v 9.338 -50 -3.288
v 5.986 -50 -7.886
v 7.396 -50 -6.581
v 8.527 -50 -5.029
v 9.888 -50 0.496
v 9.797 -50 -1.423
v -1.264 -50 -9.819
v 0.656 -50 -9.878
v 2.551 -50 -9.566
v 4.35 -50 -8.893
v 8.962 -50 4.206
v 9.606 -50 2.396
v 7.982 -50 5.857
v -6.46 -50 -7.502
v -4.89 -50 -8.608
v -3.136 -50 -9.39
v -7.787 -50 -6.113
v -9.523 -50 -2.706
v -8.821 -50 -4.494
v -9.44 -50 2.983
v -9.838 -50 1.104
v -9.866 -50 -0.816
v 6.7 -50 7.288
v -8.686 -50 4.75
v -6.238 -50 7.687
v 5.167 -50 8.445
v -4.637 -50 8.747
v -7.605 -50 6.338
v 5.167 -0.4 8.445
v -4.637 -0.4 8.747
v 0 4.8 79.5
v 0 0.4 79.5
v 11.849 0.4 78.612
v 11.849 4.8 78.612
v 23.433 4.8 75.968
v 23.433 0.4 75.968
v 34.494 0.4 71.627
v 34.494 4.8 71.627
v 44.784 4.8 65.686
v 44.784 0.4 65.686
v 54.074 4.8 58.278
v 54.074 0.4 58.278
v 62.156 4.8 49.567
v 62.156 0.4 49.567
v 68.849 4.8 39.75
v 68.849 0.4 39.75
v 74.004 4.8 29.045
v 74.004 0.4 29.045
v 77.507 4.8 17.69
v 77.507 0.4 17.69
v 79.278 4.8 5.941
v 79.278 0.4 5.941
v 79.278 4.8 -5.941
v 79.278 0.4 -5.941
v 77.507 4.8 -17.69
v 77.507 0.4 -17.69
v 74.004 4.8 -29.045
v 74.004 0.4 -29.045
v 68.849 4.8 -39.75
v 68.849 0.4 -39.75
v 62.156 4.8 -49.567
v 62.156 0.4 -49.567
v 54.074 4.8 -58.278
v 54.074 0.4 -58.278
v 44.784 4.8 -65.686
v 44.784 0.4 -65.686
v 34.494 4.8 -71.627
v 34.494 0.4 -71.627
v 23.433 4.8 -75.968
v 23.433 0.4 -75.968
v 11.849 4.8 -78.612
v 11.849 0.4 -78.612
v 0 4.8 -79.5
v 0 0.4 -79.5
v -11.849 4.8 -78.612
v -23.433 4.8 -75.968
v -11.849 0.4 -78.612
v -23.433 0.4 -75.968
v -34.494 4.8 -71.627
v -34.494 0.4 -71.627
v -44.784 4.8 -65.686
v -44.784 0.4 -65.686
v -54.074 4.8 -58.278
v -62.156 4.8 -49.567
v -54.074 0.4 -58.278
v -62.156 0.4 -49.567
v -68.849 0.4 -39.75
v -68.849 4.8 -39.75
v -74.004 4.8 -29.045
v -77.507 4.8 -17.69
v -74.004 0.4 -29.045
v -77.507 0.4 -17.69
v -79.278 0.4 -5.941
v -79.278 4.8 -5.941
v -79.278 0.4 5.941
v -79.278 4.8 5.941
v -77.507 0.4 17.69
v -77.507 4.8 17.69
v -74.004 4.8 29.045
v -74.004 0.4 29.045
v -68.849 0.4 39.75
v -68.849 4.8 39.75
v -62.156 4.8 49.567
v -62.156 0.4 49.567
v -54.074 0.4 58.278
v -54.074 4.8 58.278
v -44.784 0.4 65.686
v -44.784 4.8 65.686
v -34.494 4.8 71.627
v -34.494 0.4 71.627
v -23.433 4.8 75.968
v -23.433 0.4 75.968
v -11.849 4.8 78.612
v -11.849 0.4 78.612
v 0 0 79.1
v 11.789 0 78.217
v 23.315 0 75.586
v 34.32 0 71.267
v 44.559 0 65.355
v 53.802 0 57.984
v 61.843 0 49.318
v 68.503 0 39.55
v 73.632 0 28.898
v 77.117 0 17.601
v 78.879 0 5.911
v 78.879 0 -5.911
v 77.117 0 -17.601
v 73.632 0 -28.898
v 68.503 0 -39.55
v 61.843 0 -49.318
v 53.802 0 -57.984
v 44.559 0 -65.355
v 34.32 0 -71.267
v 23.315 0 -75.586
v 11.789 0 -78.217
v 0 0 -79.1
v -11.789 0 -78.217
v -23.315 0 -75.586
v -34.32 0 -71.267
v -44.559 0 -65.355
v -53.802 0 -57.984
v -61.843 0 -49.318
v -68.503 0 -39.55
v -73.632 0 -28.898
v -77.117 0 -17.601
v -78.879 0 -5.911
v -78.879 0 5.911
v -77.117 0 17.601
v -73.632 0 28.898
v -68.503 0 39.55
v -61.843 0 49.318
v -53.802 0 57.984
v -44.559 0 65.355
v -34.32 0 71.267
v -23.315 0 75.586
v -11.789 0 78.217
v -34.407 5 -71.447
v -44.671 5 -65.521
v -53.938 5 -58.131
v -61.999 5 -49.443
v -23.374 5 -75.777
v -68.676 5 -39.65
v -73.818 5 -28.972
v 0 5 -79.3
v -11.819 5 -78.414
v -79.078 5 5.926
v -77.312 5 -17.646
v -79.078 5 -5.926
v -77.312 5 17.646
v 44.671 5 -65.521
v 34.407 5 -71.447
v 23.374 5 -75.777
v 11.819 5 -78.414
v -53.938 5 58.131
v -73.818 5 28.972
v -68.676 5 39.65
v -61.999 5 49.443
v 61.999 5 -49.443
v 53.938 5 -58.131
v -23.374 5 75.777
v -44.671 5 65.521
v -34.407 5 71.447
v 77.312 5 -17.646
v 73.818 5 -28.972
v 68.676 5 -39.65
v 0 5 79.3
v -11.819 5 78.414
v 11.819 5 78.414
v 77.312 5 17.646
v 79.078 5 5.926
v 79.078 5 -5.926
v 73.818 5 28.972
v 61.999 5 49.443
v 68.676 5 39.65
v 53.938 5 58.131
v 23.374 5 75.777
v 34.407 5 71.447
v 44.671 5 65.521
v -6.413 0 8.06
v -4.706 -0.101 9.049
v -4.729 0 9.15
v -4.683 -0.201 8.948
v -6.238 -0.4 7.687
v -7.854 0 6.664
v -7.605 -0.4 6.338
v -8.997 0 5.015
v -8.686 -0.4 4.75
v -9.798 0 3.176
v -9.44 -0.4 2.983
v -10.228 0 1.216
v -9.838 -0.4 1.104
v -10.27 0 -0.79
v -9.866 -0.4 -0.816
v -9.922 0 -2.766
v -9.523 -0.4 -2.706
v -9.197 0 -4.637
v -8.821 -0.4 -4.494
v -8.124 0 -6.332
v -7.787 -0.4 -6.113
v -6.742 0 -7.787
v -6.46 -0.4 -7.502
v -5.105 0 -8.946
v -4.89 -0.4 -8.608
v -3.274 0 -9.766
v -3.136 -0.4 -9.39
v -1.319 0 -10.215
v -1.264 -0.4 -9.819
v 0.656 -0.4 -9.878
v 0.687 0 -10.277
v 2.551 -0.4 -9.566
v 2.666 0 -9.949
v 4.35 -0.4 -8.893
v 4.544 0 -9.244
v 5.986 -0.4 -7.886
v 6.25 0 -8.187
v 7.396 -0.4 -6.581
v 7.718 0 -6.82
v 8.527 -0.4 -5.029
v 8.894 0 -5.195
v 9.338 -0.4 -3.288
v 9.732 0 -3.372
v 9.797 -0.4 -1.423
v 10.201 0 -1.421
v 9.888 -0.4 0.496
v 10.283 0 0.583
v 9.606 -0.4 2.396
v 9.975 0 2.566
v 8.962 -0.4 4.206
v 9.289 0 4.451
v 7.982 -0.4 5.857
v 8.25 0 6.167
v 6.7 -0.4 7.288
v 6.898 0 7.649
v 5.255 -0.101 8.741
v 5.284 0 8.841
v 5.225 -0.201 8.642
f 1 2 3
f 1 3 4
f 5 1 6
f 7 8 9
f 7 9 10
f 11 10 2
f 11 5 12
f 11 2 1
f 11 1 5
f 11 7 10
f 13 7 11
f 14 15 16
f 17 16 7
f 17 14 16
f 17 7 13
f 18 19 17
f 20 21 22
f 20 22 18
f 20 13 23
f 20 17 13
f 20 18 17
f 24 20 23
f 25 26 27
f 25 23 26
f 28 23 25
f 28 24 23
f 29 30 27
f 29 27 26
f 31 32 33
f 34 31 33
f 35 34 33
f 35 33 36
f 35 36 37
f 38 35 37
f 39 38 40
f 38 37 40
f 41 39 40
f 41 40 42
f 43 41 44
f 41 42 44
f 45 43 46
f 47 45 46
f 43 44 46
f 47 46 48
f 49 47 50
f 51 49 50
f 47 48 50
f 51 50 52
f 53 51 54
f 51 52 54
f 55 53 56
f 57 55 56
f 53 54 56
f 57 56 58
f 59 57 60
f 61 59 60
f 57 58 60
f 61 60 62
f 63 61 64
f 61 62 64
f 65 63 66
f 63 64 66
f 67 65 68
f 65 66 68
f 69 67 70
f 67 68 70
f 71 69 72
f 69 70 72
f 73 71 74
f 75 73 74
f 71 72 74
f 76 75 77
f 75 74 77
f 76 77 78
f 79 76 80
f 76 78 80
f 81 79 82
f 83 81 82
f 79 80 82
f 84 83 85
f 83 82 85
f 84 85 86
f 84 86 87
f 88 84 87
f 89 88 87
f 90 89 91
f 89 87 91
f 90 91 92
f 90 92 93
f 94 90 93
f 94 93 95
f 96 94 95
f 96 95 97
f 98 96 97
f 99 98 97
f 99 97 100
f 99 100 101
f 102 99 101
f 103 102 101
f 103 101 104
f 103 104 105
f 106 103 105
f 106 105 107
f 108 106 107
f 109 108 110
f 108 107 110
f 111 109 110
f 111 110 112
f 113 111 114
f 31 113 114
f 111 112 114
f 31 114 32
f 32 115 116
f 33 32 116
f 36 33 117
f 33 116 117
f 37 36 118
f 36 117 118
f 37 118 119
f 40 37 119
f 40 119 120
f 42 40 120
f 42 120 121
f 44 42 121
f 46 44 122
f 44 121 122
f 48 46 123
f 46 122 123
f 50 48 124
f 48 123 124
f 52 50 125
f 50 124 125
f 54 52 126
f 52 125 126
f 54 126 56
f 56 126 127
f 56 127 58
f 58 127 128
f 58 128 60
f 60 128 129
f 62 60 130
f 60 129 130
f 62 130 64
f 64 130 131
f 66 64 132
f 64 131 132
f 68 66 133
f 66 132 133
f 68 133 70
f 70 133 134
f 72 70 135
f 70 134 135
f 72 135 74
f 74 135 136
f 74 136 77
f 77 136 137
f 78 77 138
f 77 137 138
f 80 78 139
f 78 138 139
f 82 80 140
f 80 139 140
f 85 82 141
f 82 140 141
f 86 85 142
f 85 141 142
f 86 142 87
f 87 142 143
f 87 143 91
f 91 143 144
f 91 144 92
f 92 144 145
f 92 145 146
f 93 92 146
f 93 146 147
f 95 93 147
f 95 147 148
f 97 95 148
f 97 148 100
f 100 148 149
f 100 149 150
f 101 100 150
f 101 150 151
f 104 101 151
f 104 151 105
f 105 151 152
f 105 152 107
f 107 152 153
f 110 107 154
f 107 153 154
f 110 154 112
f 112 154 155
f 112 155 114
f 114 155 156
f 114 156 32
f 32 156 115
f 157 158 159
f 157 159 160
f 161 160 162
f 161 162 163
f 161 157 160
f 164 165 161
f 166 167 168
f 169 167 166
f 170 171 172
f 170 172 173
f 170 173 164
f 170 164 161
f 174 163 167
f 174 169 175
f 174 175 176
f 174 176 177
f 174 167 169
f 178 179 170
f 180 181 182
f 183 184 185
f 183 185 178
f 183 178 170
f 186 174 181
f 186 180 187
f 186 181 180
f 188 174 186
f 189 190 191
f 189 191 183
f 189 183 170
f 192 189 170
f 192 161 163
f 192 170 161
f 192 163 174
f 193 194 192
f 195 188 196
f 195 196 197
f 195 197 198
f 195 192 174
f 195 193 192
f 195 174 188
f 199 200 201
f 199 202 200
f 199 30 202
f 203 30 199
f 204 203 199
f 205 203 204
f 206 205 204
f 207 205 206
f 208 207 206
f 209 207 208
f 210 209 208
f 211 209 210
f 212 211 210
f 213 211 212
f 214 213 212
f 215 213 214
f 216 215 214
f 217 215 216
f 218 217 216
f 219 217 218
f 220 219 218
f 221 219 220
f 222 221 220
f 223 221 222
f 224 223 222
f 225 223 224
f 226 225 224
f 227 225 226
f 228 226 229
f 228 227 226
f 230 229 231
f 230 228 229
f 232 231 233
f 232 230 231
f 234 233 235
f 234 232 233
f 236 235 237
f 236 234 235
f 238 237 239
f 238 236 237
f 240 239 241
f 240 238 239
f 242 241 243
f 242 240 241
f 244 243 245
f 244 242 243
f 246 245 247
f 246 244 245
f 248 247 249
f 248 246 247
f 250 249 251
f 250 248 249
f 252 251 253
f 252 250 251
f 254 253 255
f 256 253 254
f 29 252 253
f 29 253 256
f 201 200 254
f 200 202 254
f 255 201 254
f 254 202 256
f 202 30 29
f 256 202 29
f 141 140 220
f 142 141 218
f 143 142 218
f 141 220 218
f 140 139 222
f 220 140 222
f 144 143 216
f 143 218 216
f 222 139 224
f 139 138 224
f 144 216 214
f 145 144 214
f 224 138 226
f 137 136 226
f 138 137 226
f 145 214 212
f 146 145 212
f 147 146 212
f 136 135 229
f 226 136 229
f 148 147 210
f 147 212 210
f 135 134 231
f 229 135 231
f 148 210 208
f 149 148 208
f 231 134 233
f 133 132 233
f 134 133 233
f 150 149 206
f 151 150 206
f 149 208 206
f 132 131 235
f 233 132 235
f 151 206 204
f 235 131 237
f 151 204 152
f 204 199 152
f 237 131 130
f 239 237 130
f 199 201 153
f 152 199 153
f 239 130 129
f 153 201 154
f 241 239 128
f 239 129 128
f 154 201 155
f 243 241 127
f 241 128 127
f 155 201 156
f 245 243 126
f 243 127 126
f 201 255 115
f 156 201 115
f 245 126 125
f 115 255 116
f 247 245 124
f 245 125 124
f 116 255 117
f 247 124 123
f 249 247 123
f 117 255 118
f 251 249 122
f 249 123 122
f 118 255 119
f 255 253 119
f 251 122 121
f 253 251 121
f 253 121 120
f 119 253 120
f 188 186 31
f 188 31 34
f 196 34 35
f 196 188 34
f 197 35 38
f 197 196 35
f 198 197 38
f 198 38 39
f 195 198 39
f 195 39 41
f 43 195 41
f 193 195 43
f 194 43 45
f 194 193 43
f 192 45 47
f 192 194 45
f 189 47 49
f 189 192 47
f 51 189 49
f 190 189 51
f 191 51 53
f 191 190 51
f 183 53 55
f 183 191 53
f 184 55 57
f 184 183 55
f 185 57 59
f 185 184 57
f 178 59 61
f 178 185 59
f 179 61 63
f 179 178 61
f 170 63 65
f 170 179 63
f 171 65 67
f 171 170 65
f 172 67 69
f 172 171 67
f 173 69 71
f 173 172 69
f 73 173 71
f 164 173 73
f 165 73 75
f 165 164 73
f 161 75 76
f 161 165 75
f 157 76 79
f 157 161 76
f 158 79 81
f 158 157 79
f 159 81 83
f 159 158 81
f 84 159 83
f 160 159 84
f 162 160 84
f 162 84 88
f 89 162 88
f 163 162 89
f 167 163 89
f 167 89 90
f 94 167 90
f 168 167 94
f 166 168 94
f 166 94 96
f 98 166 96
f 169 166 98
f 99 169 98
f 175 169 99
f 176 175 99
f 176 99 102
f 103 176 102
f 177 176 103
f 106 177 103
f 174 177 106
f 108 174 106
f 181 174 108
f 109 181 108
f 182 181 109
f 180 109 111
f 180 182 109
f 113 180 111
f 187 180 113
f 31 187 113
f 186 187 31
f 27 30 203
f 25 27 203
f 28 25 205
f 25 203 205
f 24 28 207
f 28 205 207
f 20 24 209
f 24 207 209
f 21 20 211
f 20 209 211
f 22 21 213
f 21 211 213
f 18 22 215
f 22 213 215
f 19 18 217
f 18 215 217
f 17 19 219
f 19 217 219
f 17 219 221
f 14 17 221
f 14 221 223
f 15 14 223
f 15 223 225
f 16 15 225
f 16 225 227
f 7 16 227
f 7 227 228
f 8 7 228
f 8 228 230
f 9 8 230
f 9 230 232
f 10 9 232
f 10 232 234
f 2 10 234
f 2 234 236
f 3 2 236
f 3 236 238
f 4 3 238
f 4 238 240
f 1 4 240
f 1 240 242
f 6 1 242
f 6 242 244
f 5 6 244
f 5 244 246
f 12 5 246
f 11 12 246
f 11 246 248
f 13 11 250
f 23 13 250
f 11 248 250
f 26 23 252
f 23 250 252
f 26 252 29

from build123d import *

# Parameters (mm, degrees)
SKETCH_1_R          = 79.5
EXTRUDE_1_DEPTH     = 5
SKETCH_2_R          = 9.9
EXTRUDE_2_DEPTH     = 50
CHAMFER_1_SIZE      = 0.2
CUT_EXTRUDE_1_DEPTH = 50
CHAMFER_2_SIZE      = 0.4


with BuildPart() as part:
    # 草图1 → 凸台-拉伸1 (new body)
    with BuildSketch(Plane(origin=(0, 0, 0), x_dir=(1, 0, 0), z_dir=(0, 1, 0))):
        with Locations(Location((0, 0, 0), (0, 0, 270))):
            Circle(SKETCH_1_R)
    extrude(amount=EXTRUDE_1_DEPTH)

    # 草图2 → 凸台-拉伸2 (add)
    with BuildSketch(Plane(origin=(0, 0, 0), x_dir=(-1, 0, 0), z_dir=(0, -1, 0))):
        with Locations(Location((0, 0, 0), (0, 0, 270))):
            Circle(SKETCH_2_R)
    extrude(amount=EXTRUDE_2_DEPTH)

    # 倒角1
    chamfer_1_edges = [part.edges().sort_by_distance(p)[0] for p in [
        (0, 5, -79.5),
    ]]
    chamfer(chamfer_1_edges, length=CHAMFER_1_SIZE)

    # 草图3 → 切除-拉伸1 (cut)
    with BuildSketch(Plane(origin=(0, -50, 0), x_dir=(-1, 0, 0), z_dir=(0, -1, 0))):
        with BuildLine():
            Line((4.835339801, -8.753255909), (-5.365688092, -8.438565713))
            ThreePointArc((-5.365688092, -8.438565713), (-0.308342029, -9.995245129), (4.835339801, -8.753255909))
        make_face()
    extrude(amount=-CUT_EXTRUDE_1_DEPTH, mode=Mode.SUBTRACT)

    # 倒角2
    chamfer_2_edges = [part.edges().sort_by_distance(p)[0] for p in [
        (0.265174145, 0, 8.595910811),
        (0, 0, -79.5),
        (-0.305258609, 0, -9.895292678),
    ]]
    chamfer(chamfer_2_edges, length=CHAMFER_2_SIZE)


solid = part.part
